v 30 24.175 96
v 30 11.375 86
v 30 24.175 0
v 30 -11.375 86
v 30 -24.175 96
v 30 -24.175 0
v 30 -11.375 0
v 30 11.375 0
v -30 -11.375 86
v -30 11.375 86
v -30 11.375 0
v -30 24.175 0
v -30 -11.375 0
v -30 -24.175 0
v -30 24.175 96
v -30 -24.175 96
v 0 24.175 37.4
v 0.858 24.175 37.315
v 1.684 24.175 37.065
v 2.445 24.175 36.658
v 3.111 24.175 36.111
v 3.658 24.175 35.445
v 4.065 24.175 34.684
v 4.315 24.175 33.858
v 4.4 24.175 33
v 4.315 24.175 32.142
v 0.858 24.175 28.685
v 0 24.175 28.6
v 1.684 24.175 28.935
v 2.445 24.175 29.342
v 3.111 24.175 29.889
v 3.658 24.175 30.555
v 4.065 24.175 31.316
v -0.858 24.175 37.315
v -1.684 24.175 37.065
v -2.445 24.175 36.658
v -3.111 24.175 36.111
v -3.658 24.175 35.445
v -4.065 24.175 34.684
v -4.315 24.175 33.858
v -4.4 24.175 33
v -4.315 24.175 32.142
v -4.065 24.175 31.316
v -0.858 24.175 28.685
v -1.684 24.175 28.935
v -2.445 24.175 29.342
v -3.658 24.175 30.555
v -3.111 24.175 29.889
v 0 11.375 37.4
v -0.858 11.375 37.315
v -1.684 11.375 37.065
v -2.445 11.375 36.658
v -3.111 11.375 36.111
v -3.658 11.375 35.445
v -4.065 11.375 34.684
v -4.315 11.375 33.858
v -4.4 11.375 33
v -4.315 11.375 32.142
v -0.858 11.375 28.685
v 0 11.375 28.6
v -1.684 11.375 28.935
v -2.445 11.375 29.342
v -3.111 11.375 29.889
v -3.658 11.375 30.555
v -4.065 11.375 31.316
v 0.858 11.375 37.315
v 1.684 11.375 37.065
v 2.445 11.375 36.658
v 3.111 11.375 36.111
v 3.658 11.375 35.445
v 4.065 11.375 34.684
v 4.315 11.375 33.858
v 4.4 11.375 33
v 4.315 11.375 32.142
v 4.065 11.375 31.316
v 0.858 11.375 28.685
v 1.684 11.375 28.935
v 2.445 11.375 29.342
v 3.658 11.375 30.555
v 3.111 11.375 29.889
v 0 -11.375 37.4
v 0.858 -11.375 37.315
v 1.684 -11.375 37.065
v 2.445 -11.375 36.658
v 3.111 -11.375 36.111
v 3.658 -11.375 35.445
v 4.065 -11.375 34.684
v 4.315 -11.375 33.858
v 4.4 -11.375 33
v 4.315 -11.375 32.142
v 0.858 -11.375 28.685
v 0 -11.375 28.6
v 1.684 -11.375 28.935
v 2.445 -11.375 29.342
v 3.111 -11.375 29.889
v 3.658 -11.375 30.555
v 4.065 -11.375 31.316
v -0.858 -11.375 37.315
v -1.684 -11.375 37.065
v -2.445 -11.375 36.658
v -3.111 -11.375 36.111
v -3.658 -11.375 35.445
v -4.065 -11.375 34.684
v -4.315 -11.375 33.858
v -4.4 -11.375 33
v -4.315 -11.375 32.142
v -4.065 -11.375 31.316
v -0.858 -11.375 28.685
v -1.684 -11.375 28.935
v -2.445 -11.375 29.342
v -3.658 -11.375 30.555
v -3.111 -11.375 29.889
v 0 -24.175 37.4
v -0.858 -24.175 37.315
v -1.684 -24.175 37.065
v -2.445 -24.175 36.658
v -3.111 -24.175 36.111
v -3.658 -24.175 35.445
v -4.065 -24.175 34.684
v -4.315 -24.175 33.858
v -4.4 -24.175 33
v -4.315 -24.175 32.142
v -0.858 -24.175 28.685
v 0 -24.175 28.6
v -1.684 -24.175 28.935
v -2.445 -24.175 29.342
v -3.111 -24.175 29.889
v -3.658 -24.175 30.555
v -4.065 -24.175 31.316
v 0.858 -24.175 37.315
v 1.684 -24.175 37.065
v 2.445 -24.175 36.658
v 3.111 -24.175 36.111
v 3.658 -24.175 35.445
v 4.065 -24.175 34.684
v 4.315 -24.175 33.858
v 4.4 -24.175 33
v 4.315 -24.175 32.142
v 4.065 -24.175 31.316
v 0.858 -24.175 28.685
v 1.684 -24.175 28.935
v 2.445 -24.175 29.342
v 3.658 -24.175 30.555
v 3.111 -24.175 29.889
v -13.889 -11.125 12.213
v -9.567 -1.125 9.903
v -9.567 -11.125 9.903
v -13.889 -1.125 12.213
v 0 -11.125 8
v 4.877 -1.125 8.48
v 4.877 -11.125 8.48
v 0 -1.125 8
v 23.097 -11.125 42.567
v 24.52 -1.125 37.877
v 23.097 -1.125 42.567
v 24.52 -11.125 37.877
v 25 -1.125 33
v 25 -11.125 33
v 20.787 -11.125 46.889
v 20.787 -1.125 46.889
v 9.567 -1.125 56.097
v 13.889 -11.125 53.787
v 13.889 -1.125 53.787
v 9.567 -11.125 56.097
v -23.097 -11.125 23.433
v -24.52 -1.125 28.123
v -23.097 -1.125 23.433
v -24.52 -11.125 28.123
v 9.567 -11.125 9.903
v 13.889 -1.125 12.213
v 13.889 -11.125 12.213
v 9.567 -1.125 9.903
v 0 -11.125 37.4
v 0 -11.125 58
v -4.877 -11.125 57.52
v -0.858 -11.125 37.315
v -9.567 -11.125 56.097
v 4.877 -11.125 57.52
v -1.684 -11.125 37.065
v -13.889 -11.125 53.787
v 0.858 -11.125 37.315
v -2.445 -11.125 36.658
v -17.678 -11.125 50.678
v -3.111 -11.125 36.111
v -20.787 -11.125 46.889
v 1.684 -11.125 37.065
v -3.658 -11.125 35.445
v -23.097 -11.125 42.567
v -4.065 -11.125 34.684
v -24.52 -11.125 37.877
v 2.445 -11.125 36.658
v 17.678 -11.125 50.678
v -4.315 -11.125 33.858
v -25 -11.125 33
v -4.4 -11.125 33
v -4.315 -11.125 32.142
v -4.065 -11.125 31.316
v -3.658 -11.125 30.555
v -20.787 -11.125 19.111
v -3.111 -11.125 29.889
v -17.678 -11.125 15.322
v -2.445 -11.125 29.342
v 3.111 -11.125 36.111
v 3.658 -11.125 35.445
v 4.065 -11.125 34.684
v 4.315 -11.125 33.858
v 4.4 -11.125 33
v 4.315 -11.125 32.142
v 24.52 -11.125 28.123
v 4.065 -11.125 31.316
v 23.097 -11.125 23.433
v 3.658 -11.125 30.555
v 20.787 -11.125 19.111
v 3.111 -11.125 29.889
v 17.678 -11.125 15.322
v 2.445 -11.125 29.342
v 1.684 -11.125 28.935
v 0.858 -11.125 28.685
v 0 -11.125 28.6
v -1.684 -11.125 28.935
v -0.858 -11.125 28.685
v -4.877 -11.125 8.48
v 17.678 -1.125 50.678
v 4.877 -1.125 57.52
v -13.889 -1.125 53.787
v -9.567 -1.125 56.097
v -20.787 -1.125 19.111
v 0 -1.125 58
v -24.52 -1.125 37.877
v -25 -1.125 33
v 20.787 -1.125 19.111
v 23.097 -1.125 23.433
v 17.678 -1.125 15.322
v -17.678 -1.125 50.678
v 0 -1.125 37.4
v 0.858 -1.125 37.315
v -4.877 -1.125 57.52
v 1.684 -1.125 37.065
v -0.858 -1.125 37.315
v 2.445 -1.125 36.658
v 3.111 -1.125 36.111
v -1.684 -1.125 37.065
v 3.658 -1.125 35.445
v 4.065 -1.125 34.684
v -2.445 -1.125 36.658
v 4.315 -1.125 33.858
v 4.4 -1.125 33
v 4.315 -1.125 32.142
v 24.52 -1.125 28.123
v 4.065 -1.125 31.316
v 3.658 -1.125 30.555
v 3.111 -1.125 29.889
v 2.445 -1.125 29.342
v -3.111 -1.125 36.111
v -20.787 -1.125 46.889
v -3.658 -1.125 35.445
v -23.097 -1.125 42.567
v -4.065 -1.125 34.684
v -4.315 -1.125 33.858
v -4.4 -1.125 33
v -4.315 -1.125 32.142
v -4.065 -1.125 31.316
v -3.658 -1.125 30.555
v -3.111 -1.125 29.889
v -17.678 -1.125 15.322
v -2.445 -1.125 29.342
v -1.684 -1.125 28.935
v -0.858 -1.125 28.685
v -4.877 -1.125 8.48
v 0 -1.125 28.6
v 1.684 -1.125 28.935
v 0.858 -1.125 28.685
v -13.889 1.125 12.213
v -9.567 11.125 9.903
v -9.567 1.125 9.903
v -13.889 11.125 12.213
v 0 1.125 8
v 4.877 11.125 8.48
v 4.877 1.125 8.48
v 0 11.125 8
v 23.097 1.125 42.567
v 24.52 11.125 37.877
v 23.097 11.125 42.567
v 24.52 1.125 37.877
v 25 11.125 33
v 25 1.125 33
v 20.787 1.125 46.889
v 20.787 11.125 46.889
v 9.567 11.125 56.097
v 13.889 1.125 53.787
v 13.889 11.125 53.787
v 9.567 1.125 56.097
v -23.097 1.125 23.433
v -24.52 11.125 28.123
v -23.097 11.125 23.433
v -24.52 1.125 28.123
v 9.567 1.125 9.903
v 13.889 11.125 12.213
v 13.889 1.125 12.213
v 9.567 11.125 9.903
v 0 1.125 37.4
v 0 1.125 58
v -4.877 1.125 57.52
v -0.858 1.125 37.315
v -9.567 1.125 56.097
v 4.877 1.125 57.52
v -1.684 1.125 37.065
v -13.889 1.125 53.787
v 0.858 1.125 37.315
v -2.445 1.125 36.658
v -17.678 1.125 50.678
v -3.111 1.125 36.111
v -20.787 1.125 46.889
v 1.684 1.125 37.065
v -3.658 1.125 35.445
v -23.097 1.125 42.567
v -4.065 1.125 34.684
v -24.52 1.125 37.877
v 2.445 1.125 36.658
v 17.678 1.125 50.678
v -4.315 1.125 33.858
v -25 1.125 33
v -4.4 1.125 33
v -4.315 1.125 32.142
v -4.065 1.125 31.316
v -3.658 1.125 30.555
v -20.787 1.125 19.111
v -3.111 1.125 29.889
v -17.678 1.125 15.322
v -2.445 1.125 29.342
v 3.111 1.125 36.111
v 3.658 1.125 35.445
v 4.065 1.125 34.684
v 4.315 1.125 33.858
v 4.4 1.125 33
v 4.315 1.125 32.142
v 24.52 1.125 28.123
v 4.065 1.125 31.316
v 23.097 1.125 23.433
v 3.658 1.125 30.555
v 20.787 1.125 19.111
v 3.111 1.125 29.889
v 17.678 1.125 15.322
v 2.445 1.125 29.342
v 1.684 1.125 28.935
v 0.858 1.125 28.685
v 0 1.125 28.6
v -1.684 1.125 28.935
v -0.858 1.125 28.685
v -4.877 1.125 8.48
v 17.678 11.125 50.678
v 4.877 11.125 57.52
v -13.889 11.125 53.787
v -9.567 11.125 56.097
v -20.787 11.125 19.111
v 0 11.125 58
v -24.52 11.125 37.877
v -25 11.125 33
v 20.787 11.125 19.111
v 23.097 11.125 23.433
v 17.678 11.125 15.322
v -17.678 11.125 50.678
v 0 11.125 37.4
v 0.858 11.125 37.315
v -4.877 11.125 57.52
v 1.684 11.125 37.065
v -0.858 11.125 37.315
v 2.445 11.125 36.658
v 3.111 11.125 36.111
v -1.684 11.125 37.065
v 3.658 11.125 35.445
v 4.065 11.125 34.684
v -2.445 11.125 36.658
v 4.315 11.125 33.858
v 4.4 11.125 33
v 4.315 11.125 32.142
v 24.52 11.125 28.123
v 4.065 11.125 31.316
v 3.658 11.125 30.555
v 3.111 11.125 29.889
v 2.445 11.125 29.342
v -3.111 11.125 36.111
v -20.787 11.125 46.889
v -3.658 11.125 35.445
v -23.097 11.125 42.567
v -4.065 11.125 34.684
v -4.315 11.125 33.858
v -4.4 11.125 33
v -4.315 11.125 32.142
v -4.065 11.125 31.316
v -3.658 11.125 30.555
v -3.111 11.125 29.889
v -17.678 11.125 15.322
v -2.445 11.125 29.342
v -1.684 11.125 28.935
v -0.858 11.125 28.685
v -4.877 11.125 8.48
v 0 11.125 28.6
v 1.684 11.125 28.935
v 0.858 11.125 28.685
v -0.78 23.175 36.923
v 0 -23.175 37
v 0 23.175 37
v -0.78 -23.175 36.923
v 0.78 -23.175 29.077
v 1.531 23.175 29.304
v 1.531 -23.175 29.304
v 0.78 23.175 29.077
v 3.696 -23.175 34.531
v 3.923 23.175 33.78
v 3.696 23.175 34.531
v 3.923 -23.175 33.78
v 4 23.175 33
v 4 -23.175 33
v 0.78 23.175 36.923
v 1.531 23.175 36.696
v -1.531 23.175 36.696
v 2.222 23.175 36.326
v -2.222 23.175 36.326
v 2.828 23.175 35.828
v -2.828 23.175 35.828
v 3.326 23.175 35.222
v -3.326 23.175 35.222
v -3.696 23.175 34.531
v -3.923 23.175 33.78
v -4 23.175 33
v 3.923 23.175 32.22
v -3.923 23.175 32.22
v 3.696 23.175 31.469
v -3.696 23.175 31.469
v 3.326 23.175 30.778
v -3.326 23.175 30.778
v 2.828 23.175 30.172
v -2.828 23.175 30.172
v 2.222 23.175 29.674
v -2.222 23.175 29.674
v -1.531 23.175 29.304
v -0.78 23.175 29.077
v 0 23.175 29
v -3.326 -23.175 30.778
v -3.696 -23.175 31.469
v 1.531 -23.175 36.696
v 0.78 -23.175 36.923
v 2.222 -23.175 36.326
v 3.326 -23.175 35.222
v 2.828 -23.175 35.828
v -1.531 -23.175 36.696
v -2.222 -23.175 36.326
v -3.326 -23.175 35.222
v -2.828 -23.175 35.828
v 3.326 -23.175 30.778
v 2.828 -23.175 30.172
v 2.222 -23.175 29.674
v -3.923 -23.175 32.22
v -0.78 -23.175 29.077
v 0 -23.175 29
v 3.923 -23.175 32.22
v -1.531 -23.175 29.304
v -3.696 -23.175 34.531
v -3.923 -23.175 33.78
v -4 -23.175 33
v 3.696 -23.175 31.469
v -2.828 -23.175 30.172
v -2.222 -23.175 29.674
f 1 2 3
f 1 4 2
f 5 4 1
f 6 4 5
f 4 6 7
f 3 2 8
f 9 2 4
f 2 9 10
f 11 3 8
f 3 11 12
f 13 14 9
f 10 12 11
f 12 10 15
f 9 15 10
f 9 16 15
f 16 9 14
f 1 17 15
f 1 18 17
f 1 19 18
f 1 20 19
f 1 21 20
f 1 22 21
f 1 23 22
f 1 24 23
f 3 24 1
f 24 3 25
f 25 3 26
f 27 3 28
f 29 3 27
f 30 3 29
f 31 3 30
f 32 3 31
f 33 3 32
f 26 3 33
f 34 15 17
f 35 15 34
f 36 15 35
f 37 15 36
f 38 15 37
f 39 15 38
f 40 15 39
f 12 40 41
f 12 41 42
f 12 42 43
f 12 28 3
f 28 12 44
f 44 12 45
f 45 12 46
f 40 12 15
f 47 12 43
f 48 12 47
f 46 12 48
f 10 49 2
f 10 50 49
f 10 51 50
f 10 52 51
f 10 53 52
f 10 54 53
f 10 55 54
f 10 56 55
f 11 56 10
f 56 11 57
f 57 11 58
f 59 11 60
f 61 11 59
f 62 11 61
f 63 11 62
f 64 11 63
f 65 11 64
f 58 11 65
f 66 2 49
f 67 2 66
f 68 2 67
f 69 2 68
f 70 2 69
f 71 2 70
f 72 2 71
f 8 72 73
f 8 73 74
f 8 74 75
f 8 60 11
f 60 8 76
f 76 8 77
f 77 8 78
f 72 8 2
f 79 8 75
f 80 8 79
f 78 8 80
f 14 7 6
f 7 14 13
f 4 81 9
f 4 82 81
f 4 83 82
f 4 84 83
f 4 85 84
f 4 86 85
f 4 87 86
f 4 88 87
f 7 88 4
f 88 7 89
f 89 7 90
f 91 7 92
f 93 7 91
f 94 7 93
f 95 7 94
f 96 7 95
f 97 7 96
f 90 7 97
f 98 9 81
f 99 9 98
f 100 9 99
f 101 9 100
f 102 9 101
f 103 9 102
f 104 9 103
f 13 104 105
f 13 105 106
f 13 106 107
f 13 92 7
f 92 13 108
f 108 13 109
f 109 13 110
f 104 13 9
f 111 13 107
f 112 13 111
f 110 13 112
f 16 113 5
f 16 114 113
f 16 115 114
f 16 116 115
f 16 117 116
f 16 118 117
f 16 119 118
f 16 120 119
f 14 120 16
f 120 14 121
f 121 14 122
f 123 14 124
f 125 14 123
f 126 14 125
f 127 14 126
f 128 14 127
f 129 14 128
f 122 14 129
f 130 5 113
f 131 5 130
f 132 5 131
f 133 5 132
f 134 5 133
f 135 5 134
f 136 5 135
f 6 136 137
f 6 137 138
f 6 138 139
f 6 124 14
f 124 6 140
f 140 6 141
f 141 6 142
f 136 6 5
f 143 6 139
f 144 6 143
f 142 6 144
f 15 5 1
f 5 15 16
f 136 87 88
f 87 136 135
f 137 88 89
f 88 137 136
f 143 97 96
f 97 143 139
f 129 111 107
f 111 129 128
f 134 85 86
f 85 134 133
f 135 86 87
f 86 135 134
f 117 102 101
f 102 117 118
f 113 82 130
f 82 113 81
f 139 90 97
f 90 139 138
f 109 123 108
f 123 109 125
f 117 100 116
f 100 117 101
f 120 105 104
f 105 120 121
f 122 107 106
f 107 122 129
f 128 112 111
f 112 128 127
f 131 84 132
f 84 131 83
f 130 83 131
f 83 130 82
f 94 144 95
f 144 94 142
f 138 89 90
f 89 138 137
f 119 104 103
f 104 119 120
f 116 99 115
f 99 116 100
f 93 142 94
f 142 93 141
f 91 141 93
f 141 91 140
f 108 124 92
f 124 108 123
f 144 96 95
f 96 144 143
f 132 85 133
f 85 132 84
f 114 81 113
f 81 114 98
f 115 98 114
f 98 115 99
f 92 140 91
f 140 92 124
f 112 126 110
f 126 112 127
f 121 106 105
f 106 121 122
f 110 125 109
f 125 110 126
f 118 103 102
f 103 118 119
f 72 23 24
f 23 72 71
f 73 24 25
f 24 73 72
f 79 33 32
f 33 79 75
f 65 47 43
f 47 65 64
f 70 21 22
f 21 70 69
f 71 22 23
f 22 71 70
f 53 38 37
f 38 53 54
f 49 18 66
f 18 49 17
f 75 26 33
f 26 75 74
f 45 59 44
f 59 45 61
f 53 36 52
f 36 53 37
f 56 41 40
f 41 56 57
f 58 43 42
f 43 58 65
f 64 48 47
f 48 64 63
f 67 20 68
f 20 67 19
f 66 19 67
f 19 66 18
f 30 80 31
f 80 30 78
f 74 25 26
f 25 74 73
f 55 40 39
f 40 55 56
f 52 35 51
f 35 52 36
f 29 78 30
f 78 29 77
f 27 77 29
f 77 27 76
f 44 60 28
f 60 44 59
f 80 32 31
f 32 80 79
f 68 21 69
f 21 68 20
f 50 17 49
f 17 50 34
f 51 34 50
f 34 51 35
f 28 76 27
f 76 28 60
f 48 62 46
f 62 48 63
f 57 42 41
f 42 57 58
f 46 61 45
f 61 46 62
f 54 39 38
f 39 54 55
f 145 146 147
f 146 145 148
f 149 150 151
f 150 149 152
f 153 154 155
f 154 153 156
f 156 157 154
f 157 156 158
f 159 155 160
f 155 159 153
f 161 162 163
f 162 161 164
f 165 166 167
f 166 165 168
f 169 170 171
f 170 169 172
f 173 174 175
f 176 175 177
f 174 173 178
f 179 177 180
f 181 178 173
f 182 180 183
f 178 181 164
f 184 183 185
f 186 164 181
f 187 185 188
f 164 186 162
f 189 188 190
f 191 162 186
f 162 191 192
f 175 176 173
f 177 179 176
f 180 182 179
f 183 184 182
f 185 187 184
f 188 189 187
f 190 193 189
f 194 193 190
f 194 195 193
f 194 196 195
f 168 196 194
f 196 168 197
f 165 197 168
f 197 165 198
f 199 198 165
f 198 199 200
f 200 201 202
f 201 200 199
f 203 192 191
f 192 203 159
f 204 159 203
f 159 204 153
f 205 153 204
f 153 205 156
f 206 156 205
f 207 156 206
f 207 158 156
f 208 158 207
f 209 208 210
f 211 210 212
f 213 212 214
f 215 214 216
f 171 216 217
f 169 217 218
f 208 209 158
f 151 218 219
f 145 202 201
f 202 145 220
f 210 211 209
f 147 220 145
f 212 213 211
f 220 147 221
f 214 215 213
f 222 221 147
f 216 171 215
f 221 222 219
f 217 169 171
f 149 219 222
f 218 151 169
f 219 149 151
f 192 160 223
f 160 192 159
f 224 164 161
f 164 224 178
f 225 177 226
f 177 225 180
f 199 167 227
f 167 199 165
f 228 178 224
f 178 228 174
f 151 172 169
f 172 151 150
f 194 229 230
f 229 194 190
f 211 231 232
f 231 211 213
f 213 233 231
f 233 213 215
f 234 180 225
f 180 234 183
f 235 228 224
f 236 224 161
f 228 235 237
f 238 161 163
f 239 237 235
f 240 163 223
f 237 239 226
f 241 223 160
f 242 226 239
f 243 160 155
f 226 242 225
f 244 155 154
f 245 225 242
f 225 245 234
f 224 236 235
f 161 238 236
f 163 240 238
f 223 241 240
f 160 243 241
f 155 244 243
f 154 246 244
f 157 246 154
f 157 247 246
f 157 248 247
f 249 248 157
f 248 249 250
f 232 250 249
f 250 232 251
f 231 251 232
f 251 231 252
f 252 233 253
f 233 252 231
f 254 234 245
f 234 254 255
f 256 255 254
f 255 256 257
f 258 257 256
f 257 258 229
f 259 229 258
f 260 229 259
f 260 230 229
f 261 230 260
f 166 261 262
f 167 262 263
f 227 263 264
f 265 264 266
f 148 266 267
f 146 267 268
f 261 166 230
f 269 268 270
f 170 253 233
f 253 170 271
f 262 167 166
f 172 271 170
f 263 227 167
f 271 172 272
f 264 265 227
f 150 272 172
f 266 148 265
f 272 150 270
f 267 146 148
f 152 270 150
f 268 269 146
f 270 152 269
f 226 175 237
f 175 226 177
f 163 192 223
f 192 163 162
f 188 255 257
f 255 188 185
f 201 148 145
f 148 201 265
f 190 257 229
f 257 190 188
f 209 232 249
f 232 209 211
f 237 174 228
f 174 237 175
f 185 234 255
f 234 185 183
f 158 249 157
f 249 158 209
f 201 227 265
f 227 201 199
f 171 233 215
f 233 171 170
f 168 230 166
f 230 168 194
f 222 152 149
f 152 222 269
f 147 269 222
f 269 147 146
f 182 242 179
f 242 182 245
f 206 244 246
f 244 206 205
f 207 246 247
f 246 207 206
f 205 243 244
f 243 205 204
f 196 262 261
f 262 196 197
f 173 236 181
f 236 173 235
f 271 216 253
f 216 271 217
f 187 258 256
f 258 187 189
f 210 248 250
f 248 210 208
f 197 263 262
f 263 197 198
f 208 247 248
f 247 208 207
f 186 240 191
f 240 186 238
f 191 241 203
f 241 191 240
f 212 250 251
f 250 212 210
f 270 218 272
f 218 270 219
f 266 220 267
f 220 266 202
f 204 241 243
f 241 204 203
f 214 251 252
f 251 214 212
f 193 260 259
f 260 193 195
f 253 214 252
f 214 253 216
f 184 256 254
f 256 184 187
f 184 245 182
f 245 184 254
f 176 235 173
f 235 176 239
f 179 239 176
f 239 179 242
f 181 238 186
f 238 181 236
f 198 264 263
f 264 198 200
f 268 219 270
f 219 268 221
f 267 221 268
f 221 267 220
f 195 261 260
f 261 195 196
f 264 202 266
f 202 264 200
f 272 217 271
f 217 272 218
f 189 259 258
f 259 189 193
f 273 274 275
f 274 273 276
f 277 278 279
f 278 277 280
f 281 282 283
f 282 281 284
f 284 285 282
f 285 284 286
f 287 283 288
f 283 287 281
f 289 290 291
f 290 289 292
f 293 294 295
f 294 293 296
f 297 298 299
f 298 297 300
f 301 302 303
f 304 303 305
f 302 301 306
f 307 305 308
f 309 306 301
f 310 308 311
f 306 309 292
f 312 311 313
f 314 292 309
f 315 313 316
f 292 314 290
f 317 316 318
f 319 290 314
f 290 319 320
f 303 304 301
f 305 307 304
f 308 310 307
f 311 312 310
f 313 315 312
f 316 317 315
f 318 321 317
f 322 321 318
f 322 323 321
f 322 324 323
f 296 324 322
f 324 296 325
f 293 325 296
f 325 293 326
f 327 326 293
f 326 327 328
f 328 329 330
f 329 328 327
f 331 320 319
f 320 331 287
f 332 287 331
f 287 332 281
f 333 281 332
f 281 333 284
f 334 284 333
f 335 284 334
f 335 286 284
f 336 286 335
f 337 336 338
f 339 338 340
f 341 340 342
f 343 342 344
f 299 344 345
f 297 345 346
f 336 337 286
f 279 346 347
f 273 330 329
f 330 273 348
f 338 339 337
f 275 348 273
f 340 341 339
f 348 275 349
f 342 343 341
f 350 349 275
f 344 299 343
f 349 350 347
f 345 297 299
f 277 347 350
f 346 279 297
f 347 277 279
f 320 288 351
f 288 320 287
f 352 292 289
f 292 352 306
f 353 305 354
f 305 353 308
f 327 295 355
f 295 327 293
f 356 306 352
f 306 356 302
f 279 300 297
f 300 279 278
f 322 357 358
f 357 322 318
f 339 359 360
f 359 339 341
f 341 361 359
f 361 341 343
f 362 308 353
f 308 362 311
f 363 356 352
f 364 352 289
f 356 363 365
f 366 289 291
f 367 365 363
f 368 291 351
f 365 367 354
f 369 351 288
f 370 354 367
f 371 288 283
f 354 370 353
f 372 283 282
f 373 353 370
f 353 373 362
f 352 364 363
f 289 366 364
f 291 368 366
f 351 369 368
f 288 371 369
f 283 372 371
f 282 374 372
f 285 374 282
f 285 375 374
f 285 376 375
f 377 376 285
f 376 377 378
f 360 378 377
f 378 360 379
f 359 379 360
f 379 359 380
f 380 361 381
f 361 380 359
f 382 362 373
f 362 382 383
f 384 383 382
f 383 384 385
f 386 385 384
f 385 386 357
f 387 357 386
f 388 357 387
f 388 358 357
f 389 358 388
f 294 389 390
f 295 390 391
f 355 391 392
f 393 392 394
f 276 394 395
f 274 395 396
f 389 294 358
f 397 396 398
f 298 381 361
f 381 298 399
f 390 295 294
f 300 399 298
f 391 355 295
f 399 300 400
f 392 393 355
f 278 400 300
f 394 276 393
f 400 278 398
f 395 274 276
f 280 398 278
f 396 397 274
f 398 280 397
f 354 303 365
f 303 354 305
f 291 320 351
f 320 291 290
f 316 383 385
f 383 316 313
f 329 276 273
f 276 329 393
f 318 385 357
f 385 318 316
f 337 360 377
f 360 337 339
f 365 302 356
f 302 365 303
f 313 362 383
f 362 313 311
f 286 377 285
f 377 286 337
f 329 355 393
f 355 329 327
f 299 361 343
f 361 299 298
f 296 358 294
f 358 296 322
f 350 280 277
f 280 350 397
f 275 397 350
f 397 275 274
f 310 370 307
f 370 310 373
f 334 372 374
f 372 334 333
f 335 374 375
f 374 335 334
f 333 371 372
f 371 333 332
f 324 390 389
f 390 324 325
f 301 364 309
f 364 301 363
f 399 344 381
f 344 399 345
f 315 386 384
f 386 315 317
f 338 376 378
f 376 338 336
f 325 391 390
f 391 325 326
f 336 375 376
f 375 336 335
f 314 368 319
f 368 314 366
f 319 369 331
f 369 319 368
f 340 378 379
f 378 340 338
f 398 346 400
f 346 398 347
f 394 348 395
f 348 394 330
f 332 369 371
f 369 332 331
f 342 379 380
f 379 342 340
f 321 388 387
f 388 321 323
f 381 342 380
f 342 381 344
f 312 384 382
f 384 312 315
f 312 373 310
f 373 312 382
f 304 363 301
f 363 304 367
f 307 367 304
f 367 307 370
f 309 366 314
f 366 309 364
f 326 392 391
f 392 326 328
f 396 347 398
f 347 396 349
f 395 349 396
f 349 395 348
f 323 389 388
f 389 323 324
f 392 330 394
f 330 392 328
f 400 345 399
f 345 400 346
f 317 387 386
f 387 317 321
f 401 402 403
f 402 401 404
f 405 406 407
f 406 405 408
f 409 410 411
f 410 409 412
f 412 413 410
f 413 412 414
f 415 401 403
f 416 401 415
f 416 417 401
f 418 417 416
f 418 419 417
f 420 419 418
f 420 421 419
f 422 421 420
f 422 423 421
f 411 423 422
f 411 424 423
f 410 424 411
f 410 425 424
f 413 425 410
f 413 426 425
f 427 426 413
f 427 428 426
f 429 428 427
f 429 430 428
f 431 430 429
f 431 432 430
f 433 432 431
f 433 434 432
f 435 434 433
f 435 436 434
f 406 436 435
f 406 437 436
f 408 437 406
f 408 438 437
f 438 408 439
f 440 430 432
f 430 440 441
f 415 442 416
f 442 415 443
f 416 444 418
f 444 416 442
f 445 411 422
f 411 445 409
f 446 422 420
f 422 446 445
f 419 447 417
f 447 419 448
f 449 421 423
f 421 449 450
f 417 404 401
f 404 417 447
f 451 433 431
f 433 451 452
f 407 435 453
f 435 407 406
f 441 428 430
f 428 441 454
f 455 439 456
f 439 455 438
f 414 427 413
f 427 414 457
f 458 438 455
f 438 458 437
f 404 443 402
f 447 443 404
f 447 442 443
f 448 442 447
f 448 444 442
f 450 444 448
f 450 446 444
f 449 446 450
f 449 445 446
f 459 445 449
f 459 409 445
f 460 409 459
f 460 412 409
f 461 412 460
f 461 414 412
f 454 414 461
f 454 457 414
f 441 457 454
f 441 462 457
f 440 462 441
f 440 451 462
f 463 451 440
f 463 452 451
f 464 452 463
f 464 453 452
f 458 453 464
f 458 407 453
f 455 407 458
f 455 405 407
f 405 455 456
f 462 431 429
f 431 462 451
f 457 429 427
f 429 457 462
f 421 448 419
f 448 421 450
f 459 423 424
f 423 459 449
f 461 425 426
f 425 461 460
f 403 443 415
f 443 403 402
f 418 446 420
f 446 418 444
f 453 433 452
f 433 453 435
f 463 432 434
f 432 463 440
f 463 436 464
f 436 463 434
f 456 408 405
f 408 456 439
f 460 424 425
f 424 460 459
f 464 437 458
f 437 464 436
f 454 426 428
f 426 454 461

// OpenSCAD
$fn = 32;

// ------------------------------------------------------------------------
// Trolley wheel set: wheels d50, fork 86 mm tall
// Every part is its own module, assembly() places every instance.
// ------------------------------------------------------------------------

// --- part 1 ---
module trolley_fork() {
  difference() {
    union() {
      translate([-30, 11.375, 0]) cube([60, 12.8, 86]);
      translate([-30, -24.175, 0]) cube([60, 12.8, 86]);
      translate([-30, -24.175, 86]) cube([60, 48.35, 10]);
    }
    translate([0, -17.775, 33]) rotate([90, 0, 0]) cylinder(h = 14.8, d = 8.8, center = true);
    translate([0, 17.775, 33]) rotate([90, 0, 0]) cylinder(h = 14.8, d = 8.8, center = true);
  }
}

// --- part 2 ---
module trolley_wheel() {
  difference() {
      translate([0, 0, 0]) cylinder(h = 10, d = 50);
      translate([0, 0, -1]) cylinder(h = 12, d = 8.8);
    }
}

// --- part 3 ---
module trolley_axle() {
  translate([0, 0, -23.175]) cylinder(h = 46.35, d = 8);
}

// --- assembly ---
module assembly() {
  color([0.80, 0.24, 0.20]) translate([0, 0, 0]) rotate([0, 0, 0]) trolley_fork();
  color([0.20, 0.45, 0.75]) translate([0, -1.125, 33]) rotate([90, 0, 0]) trolley_wheel();
  color([0.25, 0.62, 0.32]) translate([0, 11.125, 33]) rotate([90, 0, 0]) trolley_wheel();
  color([0.92, 0.70, 0.18]) translate([0, 0, 33]) rotate([90, 0, 0]) trolley_axle();
}

assembly();
